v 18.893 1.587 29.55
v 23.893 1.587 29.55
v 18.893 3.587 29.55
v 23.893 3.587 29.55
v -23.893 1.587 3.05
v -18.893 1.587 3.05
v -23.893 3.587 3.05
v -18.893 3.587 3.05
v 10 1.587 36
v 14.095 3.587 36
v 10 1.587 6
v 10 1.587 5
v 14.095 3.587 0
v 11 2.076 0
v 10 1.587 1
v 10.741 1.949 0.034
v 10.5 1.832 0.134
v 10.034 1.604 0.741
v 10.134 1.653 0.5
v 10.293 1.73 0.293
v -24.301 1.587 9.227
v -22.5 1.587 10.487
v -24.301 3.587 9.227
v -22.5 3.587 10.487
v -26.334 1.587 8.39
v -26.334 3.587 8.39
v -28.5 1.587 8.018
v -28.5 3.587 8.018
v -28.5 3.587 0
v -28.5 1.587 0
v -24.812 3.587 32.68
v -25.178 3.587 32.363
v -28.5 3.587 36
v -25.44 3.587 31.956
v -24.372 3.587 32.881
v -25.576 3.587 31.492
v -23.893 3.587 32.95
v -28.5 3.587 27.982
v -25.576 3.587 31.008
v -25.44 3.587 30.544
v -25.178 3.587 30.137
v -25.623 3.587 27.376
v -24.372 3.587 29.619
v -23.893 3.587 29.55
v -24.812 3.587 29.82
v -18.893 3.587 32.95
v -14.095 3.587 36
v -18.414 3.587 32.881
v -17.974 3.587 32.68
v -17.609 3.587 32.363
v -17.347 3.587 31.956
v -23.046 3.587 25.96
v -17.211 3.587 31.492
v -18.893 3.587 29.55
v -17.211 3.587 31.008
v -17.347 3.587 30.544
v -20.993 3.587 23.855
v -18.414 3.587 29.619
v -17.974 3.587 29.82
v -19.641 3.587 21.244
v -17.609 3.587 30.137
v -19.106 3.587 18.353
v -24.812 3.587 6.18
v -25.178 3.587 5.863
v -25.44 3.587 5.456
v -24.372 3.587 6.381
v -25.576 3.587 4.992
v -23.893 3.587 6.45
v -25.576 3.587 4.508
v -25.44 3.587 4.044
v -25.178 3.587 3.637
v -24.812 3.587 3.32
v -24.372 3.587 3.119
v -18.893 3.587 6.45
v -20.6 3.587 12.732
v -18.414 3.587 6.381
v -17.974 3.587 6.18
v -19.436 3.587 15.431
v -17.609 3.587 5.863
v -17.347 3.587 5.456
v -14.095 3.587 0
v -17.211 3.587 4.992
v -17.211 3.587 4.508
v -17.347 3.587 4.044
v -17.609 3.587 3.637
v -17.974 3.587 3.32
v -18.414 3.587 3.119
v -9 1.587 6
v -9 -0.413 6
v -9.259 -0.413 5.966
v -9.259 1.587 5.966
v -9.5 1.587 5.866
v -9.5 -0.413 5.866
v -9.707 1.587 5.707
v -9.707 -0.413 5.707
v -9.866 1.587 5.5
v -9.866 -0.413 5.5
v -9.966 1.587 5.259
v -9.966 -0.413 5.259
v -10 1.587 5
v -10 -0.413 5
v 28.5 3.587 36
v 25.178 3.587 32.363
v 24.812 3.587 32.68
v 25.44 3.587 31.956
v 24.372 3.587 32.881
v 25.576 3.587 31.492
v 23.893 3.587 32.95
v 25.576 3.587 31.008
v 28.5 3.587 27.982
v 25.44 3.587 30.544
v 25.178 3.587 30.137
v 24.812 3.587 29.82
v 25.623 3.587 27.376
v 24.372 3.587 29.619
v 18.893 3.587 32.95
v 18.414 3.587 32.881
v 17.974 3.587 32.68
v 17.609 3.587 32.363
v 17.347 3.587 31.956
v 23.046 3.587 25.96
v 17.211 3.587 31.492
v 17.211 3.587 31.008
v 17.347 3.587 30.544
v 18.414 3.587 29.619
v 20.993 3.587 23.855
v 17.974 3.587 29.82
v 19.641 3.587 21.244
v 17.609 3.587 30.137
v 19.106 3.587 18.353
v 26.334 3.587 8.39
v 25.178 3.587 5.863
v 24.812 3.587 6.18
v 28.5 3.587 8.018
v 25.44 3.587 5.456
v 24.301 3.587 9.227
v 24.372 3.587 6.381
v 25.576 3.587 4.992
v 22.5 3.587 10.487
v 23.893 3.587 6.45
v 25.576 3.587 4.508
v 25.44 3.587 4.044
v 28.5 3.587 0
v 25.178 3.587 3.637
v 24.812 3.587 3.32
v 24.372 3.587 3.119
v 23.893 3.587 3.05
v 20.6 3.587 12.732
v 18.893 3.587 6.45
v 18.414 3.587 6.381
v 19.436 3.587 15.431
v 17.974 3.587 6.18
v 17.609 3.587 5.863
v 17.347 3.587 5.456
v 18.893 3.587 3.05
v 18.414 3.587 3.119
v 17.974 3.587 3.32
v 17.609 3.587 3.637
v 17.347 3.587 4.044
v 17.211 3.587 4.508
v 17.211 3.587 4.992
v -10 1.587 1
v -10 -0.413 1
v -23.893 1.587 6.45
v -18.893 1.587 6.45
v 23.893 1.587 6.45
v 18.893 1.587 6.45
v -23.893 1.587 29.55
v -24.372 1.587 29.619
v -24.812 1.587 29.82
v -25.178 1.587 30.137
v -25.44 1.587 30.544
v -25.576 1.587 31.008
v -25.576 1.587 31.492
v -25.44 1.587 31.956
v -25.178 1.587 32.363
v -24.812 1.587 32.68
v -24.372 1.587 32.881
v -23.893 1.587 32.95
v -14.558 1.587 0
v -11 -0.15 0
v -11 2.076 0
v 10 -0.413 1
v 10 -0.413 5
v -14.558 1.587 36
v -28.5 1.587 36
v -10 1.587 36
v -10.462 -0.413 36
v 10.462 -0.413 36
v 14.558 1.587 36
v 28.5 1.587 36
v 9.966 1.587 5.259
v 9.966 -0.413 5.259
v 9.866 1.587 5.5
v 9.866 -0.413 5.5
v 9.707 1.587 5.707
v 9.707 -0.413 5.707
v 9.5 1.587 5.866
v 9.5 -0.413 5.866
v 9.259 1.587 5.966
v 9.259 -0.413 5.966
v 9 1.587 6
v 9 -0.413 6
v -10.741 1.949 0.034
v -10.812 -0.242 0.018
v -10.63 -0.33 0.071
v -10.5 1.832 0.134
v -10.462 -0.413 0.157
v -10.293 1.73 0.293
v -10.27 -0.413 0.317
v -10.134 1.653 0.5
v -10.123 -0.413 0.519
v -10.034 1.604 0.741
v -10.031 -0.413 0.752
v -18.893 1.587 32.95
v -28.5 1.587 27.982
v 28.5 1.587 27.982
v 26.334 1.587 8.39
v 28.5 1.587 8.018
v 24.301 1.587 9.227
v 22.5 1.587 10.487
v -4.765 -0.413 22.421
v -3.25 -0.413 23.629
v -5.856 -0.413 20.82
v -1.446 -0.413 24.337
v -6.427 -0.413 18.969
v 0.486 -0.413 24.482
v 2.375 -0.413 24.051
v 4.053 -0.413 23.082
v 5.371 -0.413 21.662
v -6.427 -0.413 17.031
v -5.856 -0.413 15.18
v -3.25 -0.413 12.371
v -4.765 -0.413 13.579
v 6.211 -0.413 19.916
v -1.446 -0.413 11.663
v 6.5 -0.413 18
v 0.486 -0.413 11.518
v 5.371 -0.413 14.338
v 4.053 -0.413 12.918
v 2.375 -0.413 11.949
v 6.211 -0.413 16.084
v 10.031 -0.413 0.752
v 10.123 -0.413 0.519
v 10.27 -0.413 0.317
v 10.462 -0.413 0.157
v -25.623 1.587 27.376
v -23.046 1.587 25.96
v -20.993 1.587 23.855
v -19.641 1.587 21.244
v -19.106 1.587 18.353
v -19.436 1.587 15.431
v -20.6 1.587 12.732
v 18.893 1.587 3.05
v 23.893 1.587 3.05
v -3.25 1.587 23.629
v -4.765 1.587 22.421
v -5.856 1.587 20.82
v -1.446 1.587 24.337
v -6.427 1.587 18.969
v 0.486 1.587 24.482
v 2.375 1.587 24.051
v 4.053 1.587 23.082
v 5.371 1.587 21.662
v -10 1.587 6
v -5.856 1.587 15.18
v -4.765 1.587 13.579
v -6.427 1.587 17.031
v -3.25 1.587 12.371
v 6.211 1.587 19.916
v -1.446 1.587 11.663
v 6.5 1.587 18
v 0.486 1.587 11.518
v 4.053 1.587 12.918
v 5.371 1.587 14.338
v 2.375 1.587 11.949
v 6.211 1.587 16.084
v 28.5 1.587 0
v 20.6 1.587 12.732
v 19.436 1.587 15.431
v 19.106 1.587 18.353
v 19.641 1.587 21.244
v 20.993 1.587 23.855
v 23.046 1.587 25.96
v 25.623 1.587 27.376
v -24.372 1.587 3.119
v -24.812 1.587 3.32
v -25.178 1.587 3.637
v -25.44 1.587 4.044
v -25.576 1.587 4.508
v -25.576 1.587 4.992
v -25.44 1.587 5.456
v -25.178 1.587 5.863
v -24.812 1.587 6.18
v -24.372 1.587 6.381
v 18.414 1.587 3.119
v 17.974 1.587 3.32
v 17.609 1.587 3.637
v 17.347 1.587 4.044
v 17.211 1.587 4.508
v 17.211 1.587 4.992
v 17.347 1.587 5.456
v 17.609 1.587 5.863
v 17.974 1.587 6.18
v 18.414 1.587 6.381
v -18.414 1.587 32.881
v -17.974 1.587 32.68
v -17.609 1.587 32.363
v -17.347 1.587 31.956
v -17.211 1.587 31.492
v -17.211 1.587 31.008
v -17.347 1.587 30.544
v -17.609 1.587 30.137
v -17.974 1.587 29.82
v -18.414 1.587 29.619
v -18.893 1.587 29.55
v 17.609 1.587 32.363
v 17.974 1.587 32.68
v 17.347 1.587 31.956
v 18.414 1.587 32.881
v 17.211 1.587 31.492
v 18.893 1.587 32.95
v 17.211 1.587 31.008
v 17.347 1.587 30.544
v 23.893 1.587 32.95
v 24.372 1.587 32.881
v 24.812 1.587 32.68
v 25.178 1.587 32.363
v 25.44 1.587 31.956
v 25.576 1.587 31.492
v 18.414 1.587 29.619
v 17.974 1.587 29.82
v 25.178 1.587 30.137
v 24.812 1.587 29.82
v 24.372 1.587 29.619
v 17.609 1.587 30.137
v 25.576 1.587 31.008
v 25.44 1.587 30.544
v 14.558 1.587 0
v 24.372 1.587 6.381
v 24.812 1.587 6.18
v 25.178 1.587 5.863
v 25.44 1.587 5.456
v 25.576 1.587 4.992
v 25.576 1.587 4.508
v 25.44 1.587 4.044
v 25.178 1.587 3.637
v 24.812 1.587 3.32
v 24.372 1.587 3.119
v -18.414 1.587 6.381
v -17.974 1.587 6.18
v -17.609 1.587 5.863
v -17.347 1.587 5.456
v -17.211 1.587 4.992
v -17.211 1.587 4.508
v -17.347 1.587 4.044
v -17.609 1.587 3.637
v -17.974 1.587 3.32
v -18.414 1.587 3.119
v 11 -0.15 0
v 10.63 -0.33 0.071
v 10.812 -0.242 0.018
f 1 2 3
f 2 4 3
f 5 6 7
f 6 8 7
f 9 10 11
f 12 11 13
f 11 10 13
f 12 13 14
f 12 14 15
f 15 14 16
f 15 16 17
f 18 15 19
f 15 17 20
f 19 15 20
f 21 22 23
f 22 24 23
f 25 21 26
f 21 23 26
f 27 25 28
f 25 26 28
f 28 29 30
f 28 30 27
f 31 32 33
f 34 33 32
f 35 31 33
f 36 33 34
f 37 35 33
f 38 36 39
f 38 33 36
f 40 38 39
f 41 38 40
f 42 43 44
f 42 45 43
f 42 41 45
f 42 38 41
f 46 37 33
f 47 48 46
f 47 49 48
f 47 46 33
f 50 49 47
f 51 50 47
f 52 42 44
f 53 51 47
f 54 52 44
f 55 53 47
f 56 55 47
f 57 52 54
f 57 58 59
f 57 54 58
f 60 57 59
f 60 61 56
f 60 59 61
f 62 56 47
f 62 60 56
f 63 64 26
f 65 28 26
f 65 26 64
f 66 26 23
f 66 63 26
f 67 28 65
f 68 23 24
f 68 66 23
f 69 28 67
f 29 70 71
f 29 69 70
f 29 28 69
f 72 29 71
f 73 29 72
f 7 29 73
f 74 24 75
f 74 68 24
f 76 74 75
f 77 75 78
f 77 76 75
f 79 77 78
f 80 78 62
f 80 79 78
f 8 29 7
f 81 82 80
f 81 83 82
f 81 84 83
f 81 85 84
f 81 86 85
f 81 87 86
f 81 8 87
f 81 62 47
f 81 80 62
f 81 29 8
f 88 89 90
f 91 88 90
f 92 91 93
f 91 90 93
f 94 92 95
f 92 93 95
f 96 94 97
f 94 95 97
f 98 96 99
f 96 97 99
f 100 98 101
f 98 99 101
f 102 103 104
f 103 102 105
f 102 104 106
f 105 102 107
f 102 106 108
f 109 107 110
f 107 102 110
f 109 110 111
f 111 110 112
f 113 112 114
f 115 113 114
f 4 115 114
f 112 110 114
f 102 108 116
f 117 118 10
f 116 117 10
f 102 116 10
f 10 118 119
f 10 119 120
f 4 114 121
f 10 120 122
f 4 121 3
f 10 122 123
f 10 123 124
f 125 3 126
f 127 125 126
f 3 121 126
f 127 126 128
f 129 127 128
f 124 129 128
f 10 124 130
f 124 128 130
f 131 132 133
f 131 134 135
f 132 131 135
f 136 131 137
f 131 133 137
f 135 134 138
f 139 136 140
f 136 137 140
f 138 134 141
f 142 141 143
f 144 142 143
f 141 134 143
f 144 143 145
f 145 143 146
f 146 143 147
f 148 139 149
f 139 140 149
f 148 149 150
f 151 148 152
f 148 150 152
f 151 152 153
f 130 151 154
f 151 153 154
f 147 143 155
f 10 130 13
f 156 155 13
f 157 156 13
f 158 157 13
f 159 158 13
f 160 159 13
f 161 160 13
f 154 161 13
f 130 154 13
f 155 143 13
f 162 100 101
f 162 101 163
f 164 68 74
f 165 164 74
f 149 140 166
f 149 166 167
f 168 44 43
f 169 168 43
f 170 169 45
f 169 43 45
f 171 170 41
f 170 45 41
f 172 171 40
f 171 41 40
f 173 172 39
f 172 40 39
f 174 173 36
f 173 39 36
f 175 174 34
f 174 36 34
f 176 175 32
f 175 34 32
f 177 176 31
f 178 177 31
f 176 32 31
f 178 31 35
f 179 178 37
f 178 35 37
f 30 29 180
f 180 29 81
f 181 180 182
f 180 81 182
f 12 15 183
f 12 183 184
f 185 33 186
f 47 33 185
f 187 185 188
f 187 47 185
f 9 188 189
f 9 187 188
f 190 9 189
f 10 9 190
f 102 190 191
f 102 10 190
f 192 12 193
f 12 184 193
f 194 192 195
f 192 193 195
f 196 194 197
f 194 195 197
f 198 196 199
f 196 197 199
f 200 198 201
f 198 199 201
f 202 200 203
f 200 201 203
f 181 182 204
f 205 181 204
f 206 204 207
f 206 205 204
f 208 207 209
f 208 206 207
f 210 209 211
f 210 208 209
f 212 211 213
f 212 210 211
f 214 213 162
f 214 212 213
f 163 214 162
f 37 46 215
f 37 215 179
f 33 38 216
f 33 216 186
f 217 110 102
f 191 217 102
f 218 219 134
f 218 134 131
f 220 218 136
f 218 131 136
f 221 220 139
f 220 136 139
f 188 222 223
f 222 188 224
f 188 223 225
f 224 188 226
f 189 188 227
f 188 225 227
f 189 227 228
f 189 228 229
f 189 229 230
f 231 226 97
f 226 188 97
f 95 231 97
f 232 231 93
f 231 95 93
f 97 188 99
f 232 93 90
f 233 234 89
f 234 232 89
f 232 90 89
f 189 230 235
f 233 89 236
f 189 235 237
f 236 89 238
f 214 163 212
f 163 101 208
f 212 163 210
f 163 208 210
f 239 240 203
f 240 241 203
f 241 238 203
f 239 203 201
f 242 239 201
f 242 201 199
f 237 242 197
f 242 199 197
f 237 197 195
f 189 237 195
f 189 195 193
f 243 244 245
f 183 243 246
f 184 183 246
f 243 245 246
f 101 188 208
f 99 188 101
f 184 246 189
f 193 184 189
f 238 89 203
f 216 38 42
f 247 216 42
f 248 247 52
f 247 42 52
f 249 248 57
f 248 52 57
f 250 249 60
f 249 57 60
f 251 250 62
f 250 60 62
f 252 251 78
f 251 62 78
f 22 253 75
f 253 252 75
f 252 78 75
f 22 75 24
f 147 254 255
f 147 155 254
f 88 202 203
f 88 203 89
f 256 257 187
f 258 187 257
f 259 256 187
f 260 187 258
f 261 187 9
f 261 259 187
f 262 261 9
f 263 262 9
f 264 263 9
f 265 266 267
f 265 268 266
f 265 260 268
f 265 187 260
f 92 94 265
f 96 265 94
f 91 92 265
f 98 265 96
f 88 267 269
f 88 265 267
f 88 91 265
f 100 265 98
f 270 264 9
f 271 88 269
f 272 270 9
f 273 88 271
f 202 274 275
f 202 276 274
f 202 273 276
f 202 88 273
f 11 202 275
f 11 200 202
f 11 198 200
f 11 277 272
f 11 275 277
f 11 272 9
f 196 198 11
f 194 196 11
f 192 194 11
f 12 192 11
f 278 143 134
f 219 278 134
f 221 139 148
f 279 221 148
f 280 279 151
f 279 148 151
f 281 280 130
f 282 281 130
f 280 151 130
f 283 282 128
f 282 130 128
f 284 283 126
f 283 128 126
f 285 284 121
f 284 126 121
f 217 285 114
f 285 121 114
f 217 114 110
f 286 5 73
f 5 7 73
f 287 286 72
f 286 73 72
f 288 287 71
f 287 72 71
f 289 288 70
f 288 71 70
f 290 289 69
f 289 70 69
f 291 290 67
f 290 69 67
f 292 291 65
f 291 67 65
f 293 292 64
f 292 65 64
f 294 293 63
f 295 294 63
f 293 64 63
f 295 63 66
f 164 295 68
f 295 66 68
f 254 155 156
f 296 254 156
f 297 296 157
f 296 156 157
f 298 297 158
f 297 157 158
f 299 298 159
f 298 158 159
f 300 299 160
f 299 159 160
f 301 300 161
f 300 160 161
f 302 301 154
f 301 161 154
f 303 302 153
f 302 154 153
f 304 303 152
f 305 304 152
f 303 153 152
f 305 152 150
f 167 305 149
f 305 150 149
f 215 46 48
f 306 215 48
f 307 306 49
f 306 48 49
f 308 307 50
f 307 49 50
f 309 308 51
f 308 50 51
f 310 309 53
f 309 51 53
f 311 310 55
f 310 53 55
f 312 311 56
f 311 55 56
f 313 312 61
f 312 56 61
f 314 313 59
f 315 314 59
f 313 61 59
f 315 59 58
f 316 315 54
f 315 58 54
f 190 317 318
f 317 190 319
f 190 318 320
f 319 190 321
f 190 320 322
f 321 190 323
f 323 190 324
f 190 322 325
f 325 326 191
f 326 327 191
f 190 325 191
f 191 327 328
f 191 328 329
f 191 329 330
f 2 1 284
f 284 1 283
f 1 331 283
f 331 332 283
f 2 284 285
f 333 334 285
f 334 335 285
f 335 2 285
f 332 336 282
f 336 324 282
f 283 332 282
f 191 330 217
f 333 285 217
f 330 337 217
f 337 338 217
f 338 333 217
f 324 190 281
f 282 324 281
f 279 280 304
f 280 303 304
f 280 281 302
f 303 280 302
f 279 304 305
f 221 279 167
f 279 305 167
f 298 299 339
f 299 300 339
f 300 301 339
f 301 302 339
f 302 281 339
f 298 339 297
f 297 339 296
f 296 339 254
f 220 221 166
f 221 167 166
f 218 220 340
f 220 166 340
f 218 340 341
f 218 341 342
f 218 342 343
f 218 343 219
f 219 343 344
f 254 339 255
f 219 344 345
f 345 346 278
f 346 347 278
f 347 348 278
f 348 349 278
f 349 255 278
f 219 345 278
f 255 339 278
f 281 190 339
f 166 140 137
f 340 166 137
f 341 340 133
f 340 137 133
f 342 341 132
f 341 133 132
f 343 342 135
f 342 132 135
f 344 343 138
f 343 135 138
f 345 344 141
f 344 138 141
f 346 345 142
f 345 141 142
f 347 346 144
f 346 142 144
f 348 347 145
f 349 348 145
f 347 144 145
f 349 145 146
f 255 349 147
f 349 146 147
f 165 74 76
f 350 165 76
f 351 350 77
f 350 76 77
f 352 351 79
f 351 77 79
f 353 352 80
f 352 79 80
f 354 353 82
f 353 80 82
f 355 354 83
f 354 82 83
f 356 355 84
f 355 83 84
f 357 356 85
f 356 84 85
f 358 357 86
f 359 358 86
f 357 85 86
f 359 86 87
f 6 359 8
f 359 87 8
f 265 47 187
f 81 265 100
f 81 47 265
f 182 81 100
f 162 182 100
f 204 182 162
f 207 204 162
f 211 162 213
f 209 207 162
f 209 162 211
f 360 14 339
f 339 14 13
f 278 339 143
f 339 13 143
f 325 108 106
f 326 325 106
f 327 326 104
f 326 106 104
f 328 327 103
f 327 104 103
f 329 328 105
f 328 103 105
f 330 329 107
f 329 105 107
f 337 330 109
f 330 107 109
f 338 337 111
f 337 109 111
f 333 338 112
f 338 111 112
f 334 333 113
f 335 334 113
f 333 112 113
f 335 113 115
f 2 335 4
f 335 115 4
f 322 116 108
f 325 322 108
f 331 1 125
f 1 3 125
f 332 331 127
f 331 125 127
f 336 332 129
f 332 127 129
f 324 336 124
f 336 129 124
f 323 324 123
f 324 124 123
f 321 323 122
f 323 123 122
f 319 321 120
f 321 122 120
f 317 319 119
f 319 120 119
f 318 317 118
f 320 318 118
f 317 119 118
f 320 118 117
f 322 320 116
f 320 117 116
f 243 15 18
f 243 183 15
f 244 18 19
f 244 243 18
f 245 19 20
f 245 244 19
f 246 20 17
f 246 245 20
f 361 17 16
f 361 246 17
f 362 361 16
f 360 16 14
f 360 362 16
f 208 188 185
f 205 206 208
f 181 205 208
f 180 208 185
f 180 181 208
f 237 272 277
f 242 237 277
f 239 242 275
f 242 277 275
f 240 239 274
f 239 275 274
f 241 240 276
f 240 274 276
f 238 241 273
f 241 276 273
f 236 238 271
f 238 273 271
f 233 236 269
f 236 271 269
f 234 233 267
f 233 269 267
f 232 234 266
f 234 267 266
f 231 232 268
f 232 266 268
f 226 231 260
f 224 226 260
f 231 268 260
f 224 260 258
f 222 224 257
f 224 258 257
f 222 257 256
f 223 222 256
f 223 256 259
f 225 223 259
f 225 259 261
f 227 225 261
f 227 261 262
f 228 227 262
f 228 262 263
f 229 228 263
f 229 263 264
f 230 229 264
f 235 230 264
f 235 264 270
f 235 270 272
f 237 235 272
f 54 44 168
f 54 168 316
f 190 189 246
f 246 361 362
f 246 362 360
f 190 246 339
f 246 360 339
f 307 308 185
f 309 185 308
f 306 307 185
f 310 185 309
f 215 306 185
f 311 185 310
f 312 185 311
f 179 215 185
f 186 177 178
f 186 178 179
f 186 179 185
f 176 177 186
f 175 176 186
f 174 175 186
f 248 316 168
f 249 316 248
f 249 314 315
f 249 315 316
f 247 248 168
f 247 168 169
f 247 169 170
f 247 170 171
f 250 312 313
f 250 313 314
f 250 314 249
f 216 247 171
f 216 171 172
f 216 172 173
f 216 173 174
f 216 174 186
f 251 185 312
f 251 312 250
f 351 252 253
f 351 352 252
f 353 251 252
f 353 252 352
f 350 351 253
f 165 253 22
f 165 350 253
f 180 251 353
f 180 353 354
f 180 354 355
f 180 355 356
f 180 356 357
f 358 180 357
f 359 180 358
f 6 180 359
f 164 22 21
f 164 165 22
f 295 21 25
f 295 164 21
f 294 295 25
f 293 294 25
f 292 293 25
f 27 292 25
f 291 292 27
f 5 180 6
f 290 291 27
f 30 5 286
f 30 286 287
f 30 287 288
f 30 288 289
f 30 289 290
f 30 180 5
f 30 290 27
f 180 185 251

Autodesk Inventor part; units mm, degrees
ref_plane "YZ Plane" through (0, 0, 0) normal (1, 0, 0) x (0, 1, 0)
ref_plane "XZ Plane" through (0, 0, 0) normal (0, 1, 0) x (-1, 0, 0)
ref_plane "XY Plane" through (0, 0, 0) normal (0, 0, 1) x (1, 0, 0)
sketch "草圖1" plane through (0, 0, 0) normal (0, 0, 1) x (1, 0, 0)
  line L0 (-22.5, 3.5874) -> (-14.0953, 3.5874)
  line L1 (-14.0953, 3.5874) -> (-10, 1.5874)
  line L2 (-10, 1.5874) -> (0, 1.5874)
  line L3 (0.691, -0.4126) -> (-10.4623, -0.4126)
  line L4 (-10.4623, -0.4126) -> (-14.5576, 1.5874)
  line L5 (-14.5576, 1.5874) -> (-22.5, 1.5874)
  line L6 (-22.5, 1.5874) -> (-22.5, 3.5874)
  line L7 (0, 2.1547) -> (0, -6.606) construction
  line L8 (22.5, 3.5874) -> (14.0953, 3.5874)
  line L9 (14.0953, 3.5874) -> (10, 1.5874)
  line L10 (10, 1.5874) -> (0, 1.5874)
  line L11 (0.691, -0.4126) -> (10.4623, -0.4126)
  line L12 (10.4623, -0.4126) -> (14.5576, 1.5874)
  line L13 (14.5576, 1.5874) -> (22.5, 1.5874)
  line L14 (22.5, 1.5874) -> (22.5, 3.5874)
  line L15 (-22.25, -3.3995) -> (-22.25, 2.4631)
  line L16 (22.25, -3.2727) -> (22.25, 2.4631)
  line L17 (10, -4.4814) -> (10, 6.978)
  point P0 (0, 0)
  point P1 (-22.25, 1.5321)
  point P2 (22.25, 1.5874)
  point P3 (22.25, 1.5321)
  dimension "d1" = 2
  dimension "d5" = 44.5
  dimension "d9" = 45
  dimension "d32" = 10
  dimension "d36" = 2
  dimension "d46" = 2
extrude "擠出1" add sketch "草圖1" along normal blind 36
sketch "草圖2" plane through (-22.5, 3.5874, 0) normal (0, 1, 0) x (1, 0, 0)
  point P0 (22.5, 0)
sketch "草圖3" plane through (-22.5, 3.5874, 0) normal (0, 1, 0) x (1, 0, 0)
  line L0 (0, 0) -> (0, -36) projected
  line L1 (0, 0) -> (0, -10.4873)
  line L2 (0, 0) -> (-6, 0)
  line L3 (-6, 0) -> (-6, -8.018)
  line L4 (-6, -36) -> (0, -36)
  line L5 (-6, -27.982) -> (-6, -36)
  line L6 (22.5, -5.8594) -> (22.5, -37.147)
  arc A0 (0, -10.4873) -> (-6, -8.018) centre (-6.6, -18) ccw
  arc A1 (-6, -27.982) -> (0, -10.4873) centre (-6.6, -18) ccw
  line L7 (0, -25.5127) -> (0, -36)
  line L8 (45, 0) -> (45, -36)
  line L9 (45, 0) -> (45, -10.4873)
  line L10 (45, 0) -> (51, 0)
  line L11 (51, 0) -> (51, -8.018)
  line L12 (51, -36) -> (45, -36)
  line L13 (51, -27.982) -> (51, -36)
  arc A2 (51, -8.018) -> (45, -10.4873) centre (51.6, -18) ccw
  arc A3 (45, -10.4873) -> (51, -27.982) centre (51.6, -18) ccw
  line L14 (45, -25.5127) -> (45, -36)
  line L15 (-7.7403, -18) -> (53.0258, -18)
  point P0 (22.5, 0)
  point P1 (45, -25.5127)
  point P2 (-6, -4.009)
  dimension "d13" = 6.6
  dimension "d18" = 45
  dimension "d19" = 6
  dimension "d20" = 6
  dimension "d37" = 10
  dimension "d47" = 36
extrude "擠出2" add sketch "草圖3" against normal blind 2 contours L8 L10 L11 A2 | A3 L13 L12 L8 | L0 L4 L5 A1 | L0 A0 L3 L2
extrude "擠出3" cut sketch "草圖3" against normal blind 2.5 contours A3 L8 L15 | L15 L8 A3 | A1 L15 L0 | L15 A1 L0
sketch "草圖4" plane through (-14.0953, 3.5874, 36) normal (0, 1, 0) x (1, 0, 0)
  line L0 (-14.4047, 36) -> (-0.4623, 36) projected
  line L1 (-8.1547, 36) -> (-8.1547, -2.5095)
  line L2 (-14.4047, 36) -> (-14.4047, 27.982) projected
  line L3 (28.1906, 0) -> (42.5953, 0) projected
  line L4 (-9.798, 31.25) -> (-4.798, 31.25) construction
  line L5 (-9.798, 29.55) -> (-4.798, 29.55)
  line L6 (-4.798, 32.95) -> (-9.798, 32.95)
  arc A0 (-9.798, 32.95) -> (-9.798, 29.55) centre (-9.798, 31.25) ccw
  arc A1 (-4.798, 29.55) -> (-4.798, 32.95) centre (-4.798, 31.25) ccw
  line L7 (-25.514, 18) -> (67.1526, 18)
  line L8 (14.0953, -5.2274) -> (14.0953, 45.8177)
  circle A2 centre (14.0953, 18) radius 6.5
  line L9 (-9.798, 4.75) -> (-4.798, 4.75) construction
  line L10 (-9.798, 6.45) -> (-4.798, 6.45)
  line L11 (-4.798, 3.05) -> (-9.798, 3.05)
  arc A3 (-9.798, 6.45) -> (-9.798, 3.05) centre (-9.798, 4.75) ccw
  arc A4 (-4.798, 3.05) -> (-4.798, 6.45) centre (-4.798, 4.75) ccw
  line L12 (37.9886, 31.25) -> (32.9886, 31.25) construction
  line L13 (37.9886, 29.55) -> (32.9886, 29.55)
  line L14 (32.9886, 32.95) -> (37.9886, 32.95)
  arc A5 (37.9886, 29.55) -> (37.9886, 32.95) centre (37.9886, 31.25) ccw
  arc A6 (32.9886, 32.95) -> (32.9886, 29.55) centre (32.9886, 31.25) ccw
  arc A7 (32.9886, 6.45) -> (32.9886, 3.05) centre (32.9886, 4.75) ccw
  line L15 (37.9886, 6.45) -> (32.9886, 6.45)
  line L16 (37.9886, 4.75) -> (32.9886, 4.75) construction
  arc A8 (37.9886, 3.05) -> (37.9886, 6.45) centre (37.9886, 4.75) ccw
  line L17 (32.9886, 3.05) -> (37.9886, 3.05)
  point P0 (14.0953, 36)
  point P1 (-7.298, 31.25)
  point P2 (-7.298, 4.75)
  point P3 (35.4886, 31.25)
  point P4 (35.4886, 4.75)
  dimension "d21" = 6.25
  dimension "d33" = 3.4
  dimension "d48" = 36
  dimension "d49" = 13
  dimension "d52" = 26.5
  dimension "d53" = 9.2134
  dimension "d54" = 5
extrude "擠出4" cut sketch "草圖4" against normal up to surface (4 mm away)
sketch "草圖5" plane through (-10, 1.5874, 0) normal (0, 1, 0) x (1, 0, 0)
  line L0 (-0.4623, 0) -> (20.4623, 0) projected
  line L1 (0, 0) -> (20, 0)
  line L2 (20, 0) -> (20, -6)
  line L3 (20, -6) -> (0, -6)
  line L4 (0, -6) -> (0, 0)
  line L5 (10, -2.0229) -> (10, 3.2313)
  point P0 (10, 0)
  point P1 (20, 0)
  point P2 (20, 0)
  point P3 (10, 0)
  dimension "d38" = 6
  dimension "d42" = 20
extrude "擠出5" cut sketch "草圖5" against normal up to surface (2 mm away)
fillet "圓角2" radius 1 4 edges at (-10, 0.5874, 0) (10, 0.5874, 0) (-10, 0.5874, 6) (10, 0.5874, 6)
properties part number "連接件"
